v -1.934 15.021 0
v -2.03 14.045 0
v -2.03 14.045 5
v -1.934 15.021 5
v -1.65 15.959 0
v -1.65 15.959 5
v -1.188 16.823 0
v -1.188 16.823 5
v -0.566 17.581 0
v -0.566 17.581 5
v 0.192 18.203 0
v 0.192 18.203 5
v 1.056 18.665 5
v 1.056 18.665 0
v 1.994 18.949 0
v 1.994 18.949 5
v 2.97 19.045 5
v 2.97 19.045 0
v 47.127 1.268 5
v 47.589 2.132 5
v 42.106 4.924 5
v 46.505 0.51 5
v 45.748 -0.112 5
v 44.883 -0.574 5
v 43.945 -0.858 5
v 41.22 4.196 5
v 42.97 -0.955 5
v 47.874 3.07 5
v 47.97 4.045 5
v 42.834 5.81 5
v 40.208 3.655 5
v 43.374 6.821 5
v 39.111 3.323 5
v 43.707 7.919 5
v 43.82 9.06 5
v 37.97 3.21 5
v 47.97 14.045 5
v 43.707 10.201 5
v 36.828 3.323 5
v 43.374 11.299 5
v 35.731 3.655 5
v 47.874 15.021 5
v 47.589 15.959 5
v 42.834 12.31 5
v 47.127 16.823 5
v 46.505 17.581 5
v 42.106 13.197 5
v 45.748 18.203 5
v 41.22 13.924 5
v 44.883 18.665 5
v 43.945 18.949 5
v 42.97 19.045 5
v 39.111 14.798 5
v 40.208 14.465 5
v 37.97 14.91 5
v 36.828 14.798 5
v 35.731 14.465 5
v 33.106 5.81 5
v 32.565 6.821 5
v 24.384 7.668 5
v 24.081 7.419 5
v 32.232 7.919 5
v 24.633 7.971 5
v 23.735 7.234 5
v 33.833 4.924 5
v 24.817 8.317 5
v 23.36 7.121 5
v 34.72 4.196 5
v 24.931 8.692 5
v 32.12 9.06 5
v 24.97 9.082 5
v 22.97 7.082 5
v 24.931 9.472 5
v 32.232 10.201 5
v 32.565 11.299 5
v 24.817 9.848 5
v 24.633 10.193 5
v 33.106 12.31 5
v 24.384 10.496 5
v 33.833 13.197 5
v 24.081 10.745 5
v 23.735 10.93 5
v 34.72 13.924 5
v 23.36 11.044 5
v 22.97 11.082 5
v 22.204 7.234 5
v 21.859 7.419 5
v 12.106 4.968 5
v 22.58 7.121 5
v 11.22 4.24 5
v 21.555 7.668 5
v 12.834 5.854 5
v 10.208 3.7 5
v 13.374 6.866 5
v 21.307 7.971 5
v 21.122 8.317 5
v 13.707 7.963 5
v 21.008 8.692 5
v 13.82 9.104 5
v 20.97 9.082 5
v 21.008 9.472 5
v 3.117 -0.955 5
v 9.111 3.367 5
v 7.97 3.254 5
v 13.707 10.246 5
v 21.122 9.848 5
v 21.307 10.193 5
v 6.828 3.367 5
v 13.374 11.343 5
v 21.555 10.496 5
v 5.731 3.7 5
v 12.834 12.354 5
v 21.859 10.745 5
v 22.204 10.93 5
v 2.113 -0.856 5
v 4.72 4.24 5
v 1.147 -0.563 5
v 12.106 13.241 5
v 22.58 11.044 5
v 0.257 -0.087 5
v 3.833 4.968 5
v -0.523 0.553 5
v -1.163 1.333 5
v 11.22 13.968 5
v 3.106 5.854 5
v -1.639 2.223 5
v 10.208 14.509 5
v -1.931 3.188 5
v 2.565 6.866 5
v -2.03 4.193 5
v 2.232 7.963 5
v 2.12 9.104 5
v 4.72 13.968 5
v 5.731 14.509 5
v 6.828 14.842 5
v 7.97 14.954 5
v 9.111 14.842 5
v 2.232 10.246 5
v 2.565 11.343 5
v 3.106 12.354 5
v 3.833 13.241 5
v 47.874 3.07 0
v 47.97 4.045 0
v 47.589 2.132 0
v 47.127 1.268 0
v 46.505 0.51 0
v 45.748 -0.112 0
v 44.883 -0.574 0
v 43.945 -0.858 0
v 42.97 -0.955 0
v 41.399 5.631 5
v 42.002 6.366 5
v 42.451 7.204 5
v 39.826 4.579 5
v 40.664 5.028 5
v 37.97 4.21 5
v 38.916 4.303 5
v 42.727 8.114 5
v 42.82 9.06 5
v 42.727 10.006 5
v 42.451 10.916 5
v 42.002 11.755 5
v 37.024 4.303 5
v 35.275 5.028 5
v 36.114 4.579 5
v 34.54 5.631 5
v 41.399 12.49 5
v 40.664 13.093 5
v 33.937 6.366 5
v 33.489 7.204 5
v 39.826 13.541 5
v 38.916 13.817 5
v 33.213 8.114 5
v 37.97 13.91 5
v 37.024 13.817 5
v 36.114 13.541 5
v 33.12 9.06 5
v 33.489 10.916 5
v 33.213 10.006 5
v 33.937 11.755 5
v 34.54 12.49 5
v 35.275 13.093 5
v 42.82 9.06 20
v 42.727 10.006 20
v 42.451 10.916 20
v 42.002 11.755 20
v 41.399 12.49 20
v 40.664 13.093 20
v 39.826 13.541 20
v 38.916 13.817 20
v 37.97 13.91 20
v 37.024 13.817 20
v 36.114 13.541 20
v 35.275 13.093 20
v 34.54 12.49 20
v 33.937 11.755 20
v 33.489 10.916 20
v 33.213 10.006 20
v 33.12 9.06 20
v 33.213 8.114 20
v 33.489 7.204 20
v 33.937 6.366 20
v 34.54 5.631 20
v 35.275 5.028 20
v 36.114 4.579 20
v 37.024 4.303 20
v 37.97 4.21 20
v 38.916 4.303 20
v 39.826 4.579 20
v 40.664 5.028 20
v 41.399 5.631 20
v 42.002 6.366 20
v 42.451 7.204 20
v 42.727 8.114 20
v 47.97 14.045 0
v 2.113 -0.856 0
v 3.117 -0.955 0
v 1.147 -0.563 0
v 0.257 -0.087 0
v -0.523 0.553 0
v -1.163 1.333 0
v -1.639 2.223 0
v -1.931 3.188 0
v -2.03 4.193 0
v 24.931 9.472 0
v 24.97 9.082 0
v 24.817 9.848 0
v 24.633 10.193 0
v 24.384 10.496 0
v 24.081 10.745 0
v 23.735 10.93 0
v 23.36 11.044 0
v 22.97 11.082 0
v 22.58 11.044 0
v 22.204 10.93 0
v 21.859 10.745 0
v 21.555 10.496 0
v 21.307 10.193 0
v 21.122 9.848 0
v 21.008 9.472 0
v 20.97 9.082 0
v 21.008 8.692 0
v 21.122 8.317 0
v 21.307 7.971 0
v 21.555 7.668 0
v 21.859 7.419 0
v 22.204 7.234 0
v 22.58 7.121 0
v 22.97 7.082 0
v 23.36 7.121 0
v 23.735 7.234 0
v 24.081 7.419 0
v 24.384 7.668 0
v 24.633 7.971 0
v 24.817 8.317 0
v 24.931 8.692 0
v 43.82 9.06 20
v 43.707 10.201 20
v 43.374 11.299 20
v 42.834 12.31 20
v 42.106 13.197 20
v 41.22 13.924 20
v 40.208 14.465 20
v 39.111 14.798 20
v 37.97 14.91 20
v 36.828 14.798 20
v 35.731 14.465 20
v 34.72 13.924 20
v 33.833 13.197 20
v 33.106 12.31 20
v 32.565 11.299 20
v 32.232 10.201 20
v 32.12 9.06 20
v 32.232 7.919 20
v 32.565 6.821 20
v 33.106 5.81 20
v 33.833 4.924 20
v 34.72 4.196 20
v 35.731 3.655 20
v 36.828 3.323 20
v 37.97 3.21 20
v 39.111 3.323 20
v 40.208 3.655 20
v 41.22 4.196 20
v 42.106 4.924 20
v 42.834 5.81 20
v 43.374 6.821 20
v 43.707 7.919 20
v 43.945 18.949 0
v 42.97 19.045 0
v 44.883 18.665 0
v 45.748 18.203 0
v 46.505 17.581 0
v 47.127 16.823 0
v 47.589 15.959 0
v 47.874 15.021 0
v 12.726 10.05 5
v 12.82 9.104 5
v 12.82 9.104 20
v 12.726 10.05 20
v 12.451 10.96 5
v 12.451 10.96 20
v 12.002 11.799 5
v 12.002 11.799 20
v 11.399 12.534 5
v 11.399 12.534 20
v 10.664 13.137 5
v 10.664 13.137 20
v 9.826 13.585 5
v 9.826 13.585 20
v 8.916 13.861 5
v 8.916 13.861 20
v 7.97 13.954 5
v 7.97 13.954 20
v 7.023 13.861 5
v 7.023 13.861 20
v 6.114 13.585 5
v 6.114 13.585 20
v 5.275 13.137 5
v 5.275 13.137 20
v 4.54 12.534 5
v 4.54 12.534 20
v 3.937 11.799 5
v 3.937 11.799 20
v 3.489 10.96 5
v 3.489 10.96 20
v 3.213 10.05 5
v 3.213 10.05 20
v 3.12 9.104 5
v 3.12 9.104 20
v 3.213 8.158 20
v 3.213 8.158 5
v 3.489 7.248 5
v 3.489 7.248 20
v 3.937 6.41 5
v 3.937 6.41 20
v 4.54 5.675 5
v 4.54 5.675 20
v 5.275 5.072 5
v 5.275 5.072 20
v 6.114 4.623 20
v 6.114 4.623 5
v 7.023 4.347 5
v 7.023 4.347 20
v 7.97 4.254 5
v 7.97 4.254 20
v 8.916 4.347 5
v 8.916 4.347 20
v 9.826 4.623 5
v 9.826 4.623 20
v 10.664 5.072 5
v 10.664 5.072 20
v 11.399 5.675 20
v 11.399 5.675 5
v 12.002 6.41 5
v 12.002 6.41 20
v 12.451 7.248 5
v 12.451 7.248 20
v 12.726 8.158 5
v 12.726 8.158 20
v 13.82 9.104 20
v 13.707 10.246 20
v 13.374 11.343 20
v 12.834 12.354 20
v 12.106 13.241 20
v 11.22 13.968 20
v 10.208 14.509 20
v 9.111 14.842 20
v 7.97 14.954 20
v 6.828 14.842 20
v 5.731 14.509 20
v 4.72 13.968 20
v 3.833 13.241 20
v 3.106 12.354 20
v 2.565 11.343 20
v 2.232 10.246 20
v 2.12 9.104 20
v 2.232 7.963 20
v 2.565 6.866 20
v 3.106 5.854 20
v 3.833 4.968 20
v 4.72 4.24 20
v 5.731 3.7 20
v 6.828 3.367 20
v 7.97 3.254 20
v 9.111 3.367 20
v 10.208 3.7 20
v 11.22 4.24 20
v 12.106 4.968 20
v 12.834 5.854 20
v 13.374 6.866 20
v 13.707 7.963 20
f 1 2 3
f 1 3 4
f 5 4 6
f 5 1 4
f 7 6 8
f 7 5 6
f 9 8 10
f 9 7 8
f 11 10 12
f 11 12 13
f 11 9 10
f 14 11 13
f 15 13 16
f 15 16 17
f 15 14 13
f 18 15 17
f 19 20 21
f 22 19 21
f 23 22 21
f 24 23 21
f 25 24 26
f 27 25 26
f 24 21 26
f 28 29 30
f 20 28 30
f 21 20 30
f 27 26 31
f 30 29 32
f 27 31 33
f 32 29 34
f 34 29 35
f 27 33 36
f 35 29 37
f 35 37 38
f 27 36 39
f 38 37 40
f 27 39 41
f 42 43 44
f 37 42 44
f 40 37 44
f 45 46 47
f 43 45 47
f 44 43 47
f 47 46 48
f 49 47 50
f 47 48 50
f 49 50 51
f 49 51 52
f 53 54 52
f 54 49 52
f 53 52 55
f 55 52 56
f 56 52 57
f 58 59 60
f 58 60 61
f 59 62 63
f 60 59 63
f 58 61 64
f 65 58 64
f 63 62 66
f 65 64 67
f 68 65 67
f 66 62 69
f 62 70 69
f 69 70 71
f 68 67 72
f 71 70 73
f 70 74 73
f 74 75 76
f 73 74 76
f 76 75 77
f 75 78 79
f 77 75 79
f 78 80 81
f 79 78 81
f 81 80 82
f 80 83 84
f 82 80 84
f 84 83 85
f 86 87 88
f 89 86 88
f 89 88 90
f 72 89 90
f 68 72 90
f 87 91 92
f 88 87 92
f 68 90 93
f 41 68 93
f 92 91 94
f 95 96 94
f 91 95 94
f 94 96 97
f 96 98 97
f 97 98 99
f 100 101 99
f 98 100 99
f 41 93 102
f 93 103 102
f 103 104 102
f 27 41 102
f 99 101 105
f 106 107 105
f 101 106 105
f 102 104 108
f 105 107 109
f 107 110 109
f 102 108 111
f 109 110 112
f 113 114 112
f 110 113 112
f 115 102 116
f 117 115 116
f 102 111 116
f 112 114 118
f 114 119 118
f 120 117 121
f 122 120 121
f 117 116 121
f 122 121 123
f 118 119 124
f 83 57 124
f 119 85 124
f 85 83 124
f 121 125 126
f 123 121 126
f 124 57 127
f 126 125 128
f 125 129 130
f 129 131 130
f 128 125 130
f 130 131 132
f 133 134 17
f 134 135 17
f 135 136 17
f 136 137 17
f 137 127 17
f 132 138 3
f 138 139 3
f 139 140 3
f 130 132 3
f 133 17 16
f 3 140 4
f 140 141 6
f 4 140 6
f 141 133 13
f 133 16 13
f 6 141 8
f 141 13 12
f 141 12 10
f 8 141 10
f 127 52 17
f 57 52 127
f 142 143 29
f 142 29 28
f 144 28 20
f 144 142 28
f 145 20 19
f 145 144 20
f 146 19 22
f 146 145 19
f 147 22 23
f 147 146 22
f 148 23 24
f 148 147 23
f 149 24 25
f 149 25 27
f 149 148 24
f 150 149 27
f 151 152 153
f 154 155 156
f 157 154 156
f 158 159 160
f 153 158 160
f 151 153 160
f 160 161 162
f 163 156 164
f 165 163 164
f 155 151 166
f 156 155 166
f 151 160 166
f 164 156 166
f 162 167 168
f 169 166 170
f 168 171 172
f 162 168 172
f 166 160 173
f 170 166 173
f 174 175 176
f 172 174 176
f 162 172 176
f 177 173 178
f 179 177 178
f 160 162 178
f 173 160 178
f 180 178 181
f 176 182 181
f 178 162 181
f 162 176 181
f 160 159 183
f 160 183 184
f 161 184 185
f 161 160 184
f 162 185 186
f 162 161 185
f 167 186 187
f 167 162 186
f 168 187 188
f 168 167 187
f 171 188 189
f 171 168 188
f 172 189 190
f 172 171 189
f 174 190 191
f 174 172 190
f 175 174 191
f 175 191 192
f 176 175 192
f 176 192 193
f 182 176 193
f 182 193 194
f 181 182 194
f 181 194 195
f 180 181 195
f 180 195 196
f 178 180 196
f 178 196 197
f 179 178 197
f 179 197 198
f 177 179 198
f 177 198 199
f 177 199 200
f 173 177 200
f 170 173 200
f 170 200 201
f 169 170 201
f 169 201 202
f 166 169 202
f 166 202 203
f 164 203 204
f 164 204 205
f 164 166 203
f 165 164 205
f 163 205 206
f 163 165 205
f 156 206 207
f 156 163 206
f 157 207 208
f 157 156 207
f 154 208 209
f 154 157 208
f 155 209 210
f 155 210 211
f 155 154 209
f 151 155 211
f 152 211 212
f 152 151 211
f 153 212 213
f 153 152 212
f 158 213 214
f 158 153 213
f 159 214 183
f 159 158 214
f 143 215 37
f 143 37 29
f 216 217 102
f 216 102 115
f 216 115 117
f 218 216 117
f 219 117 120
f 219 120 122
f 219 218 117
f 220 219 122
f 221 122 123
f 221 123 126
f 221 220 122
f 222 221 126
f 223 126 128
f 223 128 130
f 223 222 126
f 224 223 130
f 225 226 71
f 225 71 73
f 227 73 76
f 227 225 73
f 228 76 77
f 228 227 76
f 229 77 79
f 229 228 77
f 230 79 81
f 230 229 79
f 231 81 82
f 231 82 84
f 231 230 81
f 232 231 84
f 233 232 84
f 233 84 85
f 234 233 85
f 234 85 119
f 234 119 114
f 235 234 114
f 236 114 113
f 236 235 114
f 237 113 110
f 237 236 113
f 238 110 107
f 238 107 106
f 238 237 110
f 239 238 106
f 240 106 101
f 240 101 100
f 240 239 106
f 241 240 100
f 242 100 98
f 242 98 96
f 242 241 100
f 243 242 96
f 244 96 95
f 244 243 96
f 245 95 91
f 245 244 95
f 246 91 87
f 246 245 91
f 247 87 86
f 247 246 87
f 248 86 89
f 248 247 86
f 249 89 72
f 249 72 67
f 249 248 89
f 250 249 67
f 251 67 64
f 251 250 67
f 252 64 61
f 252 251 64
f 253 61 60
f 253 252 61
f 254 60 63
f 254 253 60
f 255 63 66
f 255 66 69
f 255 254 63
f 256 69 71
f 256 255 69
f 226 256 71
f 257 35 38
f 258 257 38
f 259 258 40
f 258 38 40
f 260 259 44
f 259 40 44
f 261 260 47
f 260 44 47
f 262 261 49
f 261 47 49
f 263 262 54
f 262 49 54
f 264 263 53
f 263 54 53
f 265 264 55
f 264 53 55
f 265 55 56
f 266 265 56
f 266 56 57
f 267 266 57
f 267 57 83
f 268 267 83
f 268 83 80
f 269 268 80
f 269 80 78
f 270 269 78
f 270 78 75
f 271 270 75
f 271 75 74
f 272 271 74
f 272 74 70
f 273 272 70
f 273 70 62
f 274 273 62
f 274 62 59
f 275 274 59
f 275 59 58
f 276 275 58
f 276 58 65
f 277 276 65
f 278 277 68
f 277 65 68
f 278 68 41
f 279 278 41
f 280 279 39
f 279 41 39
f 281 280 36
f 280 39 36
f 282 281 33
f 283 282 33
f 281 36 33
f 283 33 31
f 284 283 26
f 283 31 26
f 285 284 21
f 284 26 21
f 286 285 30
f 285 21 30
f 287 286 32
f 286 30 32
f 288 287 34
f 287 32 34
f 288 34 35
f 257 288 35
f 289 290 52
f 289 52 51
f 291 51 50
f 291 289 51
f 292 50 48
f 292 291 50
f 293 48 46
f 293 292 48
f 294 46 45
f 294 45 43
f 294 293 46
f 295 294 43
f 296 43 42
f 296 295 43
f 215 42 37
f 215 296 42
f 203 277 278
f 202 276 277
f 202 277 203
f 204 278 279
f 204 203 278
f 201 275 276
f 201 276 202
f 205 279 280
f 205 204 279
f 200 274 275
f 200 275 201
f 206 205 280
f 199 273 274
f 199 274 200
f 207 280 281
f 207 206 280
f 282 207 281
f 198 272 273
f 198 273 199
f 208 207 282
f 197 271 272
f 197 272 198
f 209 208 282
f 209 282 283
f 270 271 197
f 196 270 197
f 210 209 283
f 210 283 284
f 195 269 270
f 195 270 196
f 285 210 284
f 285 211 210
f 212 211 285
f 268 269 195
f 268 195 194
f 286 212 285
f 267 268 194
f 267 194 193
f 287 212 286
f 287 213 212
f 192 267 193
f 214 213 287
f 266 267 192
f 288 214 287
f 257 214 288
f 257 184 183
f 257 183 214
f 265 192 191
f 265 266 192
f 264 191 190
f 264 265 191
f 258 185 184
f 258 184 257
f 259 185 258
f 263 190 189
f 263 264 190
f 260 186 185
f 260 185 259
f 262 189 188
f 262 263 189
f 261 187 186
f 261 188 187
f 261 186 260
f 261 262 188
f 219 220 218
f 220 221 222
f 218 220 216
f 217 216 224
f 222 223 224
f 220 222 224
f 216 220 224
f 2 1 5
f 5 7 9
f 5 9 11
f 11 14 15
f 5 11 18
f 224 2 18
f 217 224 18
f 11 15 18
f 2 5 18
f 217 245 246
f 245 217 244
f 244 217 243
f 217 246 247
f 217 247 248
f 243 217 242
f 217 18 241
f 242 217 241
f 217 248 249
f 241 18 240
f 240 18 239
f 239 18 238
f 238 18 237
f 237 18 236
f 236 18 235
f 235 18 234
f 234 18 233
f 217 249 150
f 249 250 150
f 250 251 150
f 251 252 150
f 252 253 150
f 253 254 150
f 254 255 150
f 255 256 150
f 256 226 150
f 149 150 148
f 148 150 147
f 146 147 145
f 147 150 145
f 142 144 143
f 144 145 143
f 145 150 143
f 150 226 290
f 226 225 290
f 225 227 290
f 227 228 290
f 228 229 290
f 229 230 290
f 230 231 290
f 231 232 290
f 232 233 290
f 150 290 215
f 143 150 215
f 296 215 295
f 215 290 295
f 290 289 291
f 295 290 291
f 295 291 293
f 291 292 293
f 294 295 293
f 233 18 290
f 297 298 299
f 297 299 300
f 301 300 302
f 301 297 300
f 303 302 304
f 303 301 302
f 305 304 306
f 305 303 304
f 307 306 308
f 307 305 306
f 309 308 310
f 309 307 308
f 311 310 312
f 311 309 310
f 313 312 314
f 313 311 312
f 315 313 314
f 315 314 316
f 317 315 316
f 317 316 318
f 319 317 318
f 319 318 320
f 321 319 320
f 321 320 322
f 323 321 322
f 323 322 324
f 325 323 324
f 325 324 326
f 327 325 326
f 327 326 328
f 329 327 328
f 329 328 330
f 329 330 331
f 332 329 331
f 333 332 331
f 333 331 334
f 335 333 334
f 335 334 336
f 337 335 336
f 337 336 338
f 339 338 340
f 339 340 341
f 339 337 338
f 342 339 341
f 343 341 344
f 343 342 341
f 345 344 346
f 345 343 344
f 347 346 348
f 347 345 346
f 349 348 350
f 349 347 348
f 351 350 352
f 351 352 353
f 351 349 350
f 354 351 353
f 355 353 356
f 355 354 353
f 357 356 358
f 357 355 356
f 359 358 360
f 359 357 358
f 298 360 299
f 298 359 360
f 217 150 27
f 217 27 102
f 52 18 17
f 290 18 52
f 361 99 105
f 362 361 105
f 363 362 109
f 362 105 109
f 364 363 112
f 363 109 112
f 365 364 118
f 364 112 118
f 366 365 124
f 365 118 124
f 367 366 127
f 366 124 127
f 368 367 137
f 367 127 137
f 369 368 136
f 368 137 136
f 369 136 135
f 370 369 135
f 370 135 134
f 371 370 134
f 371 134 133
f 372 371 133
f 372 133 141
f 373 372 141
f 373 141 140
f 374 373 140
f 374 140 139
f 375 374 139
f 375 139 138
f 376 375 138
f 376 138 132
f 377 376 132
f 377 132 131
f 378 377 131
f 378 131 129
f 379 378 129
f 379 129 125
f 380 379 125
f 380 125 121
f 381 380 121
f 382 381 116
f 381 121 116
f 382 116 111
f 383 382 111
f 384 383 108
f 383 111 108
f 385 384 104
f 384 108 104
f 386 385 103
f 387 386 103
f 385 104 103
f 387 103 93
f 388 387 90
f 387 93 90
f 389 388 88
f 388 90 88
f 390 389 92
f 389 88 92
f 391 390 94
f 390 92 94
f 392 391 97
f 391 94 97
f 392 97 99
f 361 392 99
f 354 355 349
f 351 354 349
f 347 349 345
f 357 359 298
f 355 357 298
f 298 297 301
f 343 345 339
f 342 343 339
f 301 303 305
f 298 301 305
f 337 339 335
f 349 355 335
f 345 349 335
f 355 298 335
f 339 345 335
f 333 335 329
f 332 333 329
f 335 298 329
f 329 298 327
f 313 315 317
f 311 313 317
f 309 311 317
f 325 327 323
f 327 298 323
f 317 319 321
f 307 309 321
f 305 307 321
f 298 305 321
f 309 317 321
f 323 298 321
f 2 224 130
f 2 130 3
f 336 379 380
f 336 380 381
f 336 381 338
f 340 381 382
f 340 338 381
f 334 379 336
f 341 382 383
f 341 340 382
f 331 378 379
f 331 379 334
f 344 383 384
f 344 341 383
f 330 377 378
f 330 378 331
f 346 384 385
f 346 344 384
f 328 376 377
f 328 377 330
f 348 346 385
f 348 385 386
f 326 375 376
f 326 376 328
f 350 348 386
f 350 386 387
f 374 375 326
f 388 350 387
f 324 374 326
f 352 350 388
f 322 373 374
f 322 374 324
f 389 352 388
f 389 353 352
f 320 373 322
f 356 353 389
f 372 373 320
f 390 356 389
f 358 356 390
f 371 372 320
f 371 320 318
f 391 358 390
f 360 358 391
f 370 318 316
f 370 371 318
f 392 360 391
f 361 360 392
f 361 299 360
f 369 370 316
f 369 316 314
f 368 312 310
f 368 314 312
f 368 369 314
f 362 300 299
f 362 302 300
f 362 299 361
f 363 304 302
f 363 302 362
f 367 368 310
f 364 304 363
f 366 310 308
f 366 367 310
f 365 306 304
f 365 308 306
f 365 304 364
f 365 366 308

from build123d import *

# Parameters (mm, degrees)
SKETCH1_R           = 2
BOSS_EXTRUDE1_DEPTH = 5
SKETCH1_4_R         = 5.85
SKETCH1_4_R_2       = 4.85
EXTRUDE_THIN1_DEPTH = 20


with BuildPart() as part:
    # Sketch1 → Boss-Extrude1 (new body)
    with BuildSketch(Plane.XY):
        with BuildLine():
            Line((2.96969697, 19.045454545), (42.96969697, 19.045454545))
            ThreePointArc((42.96969697, 19.045454545), (46.505230876, 17.580988451), (47.96969697, 14.045454545))
            Line((47.96969697, 14.045454545), (47.96969697, 4.045454545))
            ThreePointArc((47.96969697, 4.045454545), (46.505230876, 0.50992064), (42.96969697, -0.954545455))
            Line((42.96969697, -0.954545455), (3.116761061, -0.954545455))
            ThreePointArc((3.116761061, -0.954545455), (-0.522762861, 0.552994715), (-2.03030303, 4.192518637))
            Line((-2.03030303, 4.192518637), (-2.03030303, 14.045454545))
            ThreePointArc((-2.03030303, 14.045454545), (-0.565836936, 17.580988451), (2.96969697, 19.045454545))
        make_face()
        with Locations((22.96969697, 9.082220568)):
            Circle(SKETCH1_R, mode=Mode.SUBTRACT)
    extrude(amount=BOSS_EXTRUDE1_DEPTH)

    # Sketch1<4> → Extrude-Thin1 (add)
    with BuildSketch(Plane.XY):
        with Locations((7.969686156, 9.104280198)):
            Circle(SKETCH1_4_R)
        with Locations((7.969686156, 9.104280198)):
            Circle(SKETCH1_4_R_2, mode=Mode.SUBTRACT)
        with Locations((37.96969697, 9.060160955)):
            Circle(SKETCH1_4_R)
        with Locations((37.96969697, 9.060160955)):
            Circle(SKETCH1_4_R_2, mode=Mode.SUBTRACT)
    extrude(amount=EXTRUDE_THIN1_DEPTH)


solid = part.part
